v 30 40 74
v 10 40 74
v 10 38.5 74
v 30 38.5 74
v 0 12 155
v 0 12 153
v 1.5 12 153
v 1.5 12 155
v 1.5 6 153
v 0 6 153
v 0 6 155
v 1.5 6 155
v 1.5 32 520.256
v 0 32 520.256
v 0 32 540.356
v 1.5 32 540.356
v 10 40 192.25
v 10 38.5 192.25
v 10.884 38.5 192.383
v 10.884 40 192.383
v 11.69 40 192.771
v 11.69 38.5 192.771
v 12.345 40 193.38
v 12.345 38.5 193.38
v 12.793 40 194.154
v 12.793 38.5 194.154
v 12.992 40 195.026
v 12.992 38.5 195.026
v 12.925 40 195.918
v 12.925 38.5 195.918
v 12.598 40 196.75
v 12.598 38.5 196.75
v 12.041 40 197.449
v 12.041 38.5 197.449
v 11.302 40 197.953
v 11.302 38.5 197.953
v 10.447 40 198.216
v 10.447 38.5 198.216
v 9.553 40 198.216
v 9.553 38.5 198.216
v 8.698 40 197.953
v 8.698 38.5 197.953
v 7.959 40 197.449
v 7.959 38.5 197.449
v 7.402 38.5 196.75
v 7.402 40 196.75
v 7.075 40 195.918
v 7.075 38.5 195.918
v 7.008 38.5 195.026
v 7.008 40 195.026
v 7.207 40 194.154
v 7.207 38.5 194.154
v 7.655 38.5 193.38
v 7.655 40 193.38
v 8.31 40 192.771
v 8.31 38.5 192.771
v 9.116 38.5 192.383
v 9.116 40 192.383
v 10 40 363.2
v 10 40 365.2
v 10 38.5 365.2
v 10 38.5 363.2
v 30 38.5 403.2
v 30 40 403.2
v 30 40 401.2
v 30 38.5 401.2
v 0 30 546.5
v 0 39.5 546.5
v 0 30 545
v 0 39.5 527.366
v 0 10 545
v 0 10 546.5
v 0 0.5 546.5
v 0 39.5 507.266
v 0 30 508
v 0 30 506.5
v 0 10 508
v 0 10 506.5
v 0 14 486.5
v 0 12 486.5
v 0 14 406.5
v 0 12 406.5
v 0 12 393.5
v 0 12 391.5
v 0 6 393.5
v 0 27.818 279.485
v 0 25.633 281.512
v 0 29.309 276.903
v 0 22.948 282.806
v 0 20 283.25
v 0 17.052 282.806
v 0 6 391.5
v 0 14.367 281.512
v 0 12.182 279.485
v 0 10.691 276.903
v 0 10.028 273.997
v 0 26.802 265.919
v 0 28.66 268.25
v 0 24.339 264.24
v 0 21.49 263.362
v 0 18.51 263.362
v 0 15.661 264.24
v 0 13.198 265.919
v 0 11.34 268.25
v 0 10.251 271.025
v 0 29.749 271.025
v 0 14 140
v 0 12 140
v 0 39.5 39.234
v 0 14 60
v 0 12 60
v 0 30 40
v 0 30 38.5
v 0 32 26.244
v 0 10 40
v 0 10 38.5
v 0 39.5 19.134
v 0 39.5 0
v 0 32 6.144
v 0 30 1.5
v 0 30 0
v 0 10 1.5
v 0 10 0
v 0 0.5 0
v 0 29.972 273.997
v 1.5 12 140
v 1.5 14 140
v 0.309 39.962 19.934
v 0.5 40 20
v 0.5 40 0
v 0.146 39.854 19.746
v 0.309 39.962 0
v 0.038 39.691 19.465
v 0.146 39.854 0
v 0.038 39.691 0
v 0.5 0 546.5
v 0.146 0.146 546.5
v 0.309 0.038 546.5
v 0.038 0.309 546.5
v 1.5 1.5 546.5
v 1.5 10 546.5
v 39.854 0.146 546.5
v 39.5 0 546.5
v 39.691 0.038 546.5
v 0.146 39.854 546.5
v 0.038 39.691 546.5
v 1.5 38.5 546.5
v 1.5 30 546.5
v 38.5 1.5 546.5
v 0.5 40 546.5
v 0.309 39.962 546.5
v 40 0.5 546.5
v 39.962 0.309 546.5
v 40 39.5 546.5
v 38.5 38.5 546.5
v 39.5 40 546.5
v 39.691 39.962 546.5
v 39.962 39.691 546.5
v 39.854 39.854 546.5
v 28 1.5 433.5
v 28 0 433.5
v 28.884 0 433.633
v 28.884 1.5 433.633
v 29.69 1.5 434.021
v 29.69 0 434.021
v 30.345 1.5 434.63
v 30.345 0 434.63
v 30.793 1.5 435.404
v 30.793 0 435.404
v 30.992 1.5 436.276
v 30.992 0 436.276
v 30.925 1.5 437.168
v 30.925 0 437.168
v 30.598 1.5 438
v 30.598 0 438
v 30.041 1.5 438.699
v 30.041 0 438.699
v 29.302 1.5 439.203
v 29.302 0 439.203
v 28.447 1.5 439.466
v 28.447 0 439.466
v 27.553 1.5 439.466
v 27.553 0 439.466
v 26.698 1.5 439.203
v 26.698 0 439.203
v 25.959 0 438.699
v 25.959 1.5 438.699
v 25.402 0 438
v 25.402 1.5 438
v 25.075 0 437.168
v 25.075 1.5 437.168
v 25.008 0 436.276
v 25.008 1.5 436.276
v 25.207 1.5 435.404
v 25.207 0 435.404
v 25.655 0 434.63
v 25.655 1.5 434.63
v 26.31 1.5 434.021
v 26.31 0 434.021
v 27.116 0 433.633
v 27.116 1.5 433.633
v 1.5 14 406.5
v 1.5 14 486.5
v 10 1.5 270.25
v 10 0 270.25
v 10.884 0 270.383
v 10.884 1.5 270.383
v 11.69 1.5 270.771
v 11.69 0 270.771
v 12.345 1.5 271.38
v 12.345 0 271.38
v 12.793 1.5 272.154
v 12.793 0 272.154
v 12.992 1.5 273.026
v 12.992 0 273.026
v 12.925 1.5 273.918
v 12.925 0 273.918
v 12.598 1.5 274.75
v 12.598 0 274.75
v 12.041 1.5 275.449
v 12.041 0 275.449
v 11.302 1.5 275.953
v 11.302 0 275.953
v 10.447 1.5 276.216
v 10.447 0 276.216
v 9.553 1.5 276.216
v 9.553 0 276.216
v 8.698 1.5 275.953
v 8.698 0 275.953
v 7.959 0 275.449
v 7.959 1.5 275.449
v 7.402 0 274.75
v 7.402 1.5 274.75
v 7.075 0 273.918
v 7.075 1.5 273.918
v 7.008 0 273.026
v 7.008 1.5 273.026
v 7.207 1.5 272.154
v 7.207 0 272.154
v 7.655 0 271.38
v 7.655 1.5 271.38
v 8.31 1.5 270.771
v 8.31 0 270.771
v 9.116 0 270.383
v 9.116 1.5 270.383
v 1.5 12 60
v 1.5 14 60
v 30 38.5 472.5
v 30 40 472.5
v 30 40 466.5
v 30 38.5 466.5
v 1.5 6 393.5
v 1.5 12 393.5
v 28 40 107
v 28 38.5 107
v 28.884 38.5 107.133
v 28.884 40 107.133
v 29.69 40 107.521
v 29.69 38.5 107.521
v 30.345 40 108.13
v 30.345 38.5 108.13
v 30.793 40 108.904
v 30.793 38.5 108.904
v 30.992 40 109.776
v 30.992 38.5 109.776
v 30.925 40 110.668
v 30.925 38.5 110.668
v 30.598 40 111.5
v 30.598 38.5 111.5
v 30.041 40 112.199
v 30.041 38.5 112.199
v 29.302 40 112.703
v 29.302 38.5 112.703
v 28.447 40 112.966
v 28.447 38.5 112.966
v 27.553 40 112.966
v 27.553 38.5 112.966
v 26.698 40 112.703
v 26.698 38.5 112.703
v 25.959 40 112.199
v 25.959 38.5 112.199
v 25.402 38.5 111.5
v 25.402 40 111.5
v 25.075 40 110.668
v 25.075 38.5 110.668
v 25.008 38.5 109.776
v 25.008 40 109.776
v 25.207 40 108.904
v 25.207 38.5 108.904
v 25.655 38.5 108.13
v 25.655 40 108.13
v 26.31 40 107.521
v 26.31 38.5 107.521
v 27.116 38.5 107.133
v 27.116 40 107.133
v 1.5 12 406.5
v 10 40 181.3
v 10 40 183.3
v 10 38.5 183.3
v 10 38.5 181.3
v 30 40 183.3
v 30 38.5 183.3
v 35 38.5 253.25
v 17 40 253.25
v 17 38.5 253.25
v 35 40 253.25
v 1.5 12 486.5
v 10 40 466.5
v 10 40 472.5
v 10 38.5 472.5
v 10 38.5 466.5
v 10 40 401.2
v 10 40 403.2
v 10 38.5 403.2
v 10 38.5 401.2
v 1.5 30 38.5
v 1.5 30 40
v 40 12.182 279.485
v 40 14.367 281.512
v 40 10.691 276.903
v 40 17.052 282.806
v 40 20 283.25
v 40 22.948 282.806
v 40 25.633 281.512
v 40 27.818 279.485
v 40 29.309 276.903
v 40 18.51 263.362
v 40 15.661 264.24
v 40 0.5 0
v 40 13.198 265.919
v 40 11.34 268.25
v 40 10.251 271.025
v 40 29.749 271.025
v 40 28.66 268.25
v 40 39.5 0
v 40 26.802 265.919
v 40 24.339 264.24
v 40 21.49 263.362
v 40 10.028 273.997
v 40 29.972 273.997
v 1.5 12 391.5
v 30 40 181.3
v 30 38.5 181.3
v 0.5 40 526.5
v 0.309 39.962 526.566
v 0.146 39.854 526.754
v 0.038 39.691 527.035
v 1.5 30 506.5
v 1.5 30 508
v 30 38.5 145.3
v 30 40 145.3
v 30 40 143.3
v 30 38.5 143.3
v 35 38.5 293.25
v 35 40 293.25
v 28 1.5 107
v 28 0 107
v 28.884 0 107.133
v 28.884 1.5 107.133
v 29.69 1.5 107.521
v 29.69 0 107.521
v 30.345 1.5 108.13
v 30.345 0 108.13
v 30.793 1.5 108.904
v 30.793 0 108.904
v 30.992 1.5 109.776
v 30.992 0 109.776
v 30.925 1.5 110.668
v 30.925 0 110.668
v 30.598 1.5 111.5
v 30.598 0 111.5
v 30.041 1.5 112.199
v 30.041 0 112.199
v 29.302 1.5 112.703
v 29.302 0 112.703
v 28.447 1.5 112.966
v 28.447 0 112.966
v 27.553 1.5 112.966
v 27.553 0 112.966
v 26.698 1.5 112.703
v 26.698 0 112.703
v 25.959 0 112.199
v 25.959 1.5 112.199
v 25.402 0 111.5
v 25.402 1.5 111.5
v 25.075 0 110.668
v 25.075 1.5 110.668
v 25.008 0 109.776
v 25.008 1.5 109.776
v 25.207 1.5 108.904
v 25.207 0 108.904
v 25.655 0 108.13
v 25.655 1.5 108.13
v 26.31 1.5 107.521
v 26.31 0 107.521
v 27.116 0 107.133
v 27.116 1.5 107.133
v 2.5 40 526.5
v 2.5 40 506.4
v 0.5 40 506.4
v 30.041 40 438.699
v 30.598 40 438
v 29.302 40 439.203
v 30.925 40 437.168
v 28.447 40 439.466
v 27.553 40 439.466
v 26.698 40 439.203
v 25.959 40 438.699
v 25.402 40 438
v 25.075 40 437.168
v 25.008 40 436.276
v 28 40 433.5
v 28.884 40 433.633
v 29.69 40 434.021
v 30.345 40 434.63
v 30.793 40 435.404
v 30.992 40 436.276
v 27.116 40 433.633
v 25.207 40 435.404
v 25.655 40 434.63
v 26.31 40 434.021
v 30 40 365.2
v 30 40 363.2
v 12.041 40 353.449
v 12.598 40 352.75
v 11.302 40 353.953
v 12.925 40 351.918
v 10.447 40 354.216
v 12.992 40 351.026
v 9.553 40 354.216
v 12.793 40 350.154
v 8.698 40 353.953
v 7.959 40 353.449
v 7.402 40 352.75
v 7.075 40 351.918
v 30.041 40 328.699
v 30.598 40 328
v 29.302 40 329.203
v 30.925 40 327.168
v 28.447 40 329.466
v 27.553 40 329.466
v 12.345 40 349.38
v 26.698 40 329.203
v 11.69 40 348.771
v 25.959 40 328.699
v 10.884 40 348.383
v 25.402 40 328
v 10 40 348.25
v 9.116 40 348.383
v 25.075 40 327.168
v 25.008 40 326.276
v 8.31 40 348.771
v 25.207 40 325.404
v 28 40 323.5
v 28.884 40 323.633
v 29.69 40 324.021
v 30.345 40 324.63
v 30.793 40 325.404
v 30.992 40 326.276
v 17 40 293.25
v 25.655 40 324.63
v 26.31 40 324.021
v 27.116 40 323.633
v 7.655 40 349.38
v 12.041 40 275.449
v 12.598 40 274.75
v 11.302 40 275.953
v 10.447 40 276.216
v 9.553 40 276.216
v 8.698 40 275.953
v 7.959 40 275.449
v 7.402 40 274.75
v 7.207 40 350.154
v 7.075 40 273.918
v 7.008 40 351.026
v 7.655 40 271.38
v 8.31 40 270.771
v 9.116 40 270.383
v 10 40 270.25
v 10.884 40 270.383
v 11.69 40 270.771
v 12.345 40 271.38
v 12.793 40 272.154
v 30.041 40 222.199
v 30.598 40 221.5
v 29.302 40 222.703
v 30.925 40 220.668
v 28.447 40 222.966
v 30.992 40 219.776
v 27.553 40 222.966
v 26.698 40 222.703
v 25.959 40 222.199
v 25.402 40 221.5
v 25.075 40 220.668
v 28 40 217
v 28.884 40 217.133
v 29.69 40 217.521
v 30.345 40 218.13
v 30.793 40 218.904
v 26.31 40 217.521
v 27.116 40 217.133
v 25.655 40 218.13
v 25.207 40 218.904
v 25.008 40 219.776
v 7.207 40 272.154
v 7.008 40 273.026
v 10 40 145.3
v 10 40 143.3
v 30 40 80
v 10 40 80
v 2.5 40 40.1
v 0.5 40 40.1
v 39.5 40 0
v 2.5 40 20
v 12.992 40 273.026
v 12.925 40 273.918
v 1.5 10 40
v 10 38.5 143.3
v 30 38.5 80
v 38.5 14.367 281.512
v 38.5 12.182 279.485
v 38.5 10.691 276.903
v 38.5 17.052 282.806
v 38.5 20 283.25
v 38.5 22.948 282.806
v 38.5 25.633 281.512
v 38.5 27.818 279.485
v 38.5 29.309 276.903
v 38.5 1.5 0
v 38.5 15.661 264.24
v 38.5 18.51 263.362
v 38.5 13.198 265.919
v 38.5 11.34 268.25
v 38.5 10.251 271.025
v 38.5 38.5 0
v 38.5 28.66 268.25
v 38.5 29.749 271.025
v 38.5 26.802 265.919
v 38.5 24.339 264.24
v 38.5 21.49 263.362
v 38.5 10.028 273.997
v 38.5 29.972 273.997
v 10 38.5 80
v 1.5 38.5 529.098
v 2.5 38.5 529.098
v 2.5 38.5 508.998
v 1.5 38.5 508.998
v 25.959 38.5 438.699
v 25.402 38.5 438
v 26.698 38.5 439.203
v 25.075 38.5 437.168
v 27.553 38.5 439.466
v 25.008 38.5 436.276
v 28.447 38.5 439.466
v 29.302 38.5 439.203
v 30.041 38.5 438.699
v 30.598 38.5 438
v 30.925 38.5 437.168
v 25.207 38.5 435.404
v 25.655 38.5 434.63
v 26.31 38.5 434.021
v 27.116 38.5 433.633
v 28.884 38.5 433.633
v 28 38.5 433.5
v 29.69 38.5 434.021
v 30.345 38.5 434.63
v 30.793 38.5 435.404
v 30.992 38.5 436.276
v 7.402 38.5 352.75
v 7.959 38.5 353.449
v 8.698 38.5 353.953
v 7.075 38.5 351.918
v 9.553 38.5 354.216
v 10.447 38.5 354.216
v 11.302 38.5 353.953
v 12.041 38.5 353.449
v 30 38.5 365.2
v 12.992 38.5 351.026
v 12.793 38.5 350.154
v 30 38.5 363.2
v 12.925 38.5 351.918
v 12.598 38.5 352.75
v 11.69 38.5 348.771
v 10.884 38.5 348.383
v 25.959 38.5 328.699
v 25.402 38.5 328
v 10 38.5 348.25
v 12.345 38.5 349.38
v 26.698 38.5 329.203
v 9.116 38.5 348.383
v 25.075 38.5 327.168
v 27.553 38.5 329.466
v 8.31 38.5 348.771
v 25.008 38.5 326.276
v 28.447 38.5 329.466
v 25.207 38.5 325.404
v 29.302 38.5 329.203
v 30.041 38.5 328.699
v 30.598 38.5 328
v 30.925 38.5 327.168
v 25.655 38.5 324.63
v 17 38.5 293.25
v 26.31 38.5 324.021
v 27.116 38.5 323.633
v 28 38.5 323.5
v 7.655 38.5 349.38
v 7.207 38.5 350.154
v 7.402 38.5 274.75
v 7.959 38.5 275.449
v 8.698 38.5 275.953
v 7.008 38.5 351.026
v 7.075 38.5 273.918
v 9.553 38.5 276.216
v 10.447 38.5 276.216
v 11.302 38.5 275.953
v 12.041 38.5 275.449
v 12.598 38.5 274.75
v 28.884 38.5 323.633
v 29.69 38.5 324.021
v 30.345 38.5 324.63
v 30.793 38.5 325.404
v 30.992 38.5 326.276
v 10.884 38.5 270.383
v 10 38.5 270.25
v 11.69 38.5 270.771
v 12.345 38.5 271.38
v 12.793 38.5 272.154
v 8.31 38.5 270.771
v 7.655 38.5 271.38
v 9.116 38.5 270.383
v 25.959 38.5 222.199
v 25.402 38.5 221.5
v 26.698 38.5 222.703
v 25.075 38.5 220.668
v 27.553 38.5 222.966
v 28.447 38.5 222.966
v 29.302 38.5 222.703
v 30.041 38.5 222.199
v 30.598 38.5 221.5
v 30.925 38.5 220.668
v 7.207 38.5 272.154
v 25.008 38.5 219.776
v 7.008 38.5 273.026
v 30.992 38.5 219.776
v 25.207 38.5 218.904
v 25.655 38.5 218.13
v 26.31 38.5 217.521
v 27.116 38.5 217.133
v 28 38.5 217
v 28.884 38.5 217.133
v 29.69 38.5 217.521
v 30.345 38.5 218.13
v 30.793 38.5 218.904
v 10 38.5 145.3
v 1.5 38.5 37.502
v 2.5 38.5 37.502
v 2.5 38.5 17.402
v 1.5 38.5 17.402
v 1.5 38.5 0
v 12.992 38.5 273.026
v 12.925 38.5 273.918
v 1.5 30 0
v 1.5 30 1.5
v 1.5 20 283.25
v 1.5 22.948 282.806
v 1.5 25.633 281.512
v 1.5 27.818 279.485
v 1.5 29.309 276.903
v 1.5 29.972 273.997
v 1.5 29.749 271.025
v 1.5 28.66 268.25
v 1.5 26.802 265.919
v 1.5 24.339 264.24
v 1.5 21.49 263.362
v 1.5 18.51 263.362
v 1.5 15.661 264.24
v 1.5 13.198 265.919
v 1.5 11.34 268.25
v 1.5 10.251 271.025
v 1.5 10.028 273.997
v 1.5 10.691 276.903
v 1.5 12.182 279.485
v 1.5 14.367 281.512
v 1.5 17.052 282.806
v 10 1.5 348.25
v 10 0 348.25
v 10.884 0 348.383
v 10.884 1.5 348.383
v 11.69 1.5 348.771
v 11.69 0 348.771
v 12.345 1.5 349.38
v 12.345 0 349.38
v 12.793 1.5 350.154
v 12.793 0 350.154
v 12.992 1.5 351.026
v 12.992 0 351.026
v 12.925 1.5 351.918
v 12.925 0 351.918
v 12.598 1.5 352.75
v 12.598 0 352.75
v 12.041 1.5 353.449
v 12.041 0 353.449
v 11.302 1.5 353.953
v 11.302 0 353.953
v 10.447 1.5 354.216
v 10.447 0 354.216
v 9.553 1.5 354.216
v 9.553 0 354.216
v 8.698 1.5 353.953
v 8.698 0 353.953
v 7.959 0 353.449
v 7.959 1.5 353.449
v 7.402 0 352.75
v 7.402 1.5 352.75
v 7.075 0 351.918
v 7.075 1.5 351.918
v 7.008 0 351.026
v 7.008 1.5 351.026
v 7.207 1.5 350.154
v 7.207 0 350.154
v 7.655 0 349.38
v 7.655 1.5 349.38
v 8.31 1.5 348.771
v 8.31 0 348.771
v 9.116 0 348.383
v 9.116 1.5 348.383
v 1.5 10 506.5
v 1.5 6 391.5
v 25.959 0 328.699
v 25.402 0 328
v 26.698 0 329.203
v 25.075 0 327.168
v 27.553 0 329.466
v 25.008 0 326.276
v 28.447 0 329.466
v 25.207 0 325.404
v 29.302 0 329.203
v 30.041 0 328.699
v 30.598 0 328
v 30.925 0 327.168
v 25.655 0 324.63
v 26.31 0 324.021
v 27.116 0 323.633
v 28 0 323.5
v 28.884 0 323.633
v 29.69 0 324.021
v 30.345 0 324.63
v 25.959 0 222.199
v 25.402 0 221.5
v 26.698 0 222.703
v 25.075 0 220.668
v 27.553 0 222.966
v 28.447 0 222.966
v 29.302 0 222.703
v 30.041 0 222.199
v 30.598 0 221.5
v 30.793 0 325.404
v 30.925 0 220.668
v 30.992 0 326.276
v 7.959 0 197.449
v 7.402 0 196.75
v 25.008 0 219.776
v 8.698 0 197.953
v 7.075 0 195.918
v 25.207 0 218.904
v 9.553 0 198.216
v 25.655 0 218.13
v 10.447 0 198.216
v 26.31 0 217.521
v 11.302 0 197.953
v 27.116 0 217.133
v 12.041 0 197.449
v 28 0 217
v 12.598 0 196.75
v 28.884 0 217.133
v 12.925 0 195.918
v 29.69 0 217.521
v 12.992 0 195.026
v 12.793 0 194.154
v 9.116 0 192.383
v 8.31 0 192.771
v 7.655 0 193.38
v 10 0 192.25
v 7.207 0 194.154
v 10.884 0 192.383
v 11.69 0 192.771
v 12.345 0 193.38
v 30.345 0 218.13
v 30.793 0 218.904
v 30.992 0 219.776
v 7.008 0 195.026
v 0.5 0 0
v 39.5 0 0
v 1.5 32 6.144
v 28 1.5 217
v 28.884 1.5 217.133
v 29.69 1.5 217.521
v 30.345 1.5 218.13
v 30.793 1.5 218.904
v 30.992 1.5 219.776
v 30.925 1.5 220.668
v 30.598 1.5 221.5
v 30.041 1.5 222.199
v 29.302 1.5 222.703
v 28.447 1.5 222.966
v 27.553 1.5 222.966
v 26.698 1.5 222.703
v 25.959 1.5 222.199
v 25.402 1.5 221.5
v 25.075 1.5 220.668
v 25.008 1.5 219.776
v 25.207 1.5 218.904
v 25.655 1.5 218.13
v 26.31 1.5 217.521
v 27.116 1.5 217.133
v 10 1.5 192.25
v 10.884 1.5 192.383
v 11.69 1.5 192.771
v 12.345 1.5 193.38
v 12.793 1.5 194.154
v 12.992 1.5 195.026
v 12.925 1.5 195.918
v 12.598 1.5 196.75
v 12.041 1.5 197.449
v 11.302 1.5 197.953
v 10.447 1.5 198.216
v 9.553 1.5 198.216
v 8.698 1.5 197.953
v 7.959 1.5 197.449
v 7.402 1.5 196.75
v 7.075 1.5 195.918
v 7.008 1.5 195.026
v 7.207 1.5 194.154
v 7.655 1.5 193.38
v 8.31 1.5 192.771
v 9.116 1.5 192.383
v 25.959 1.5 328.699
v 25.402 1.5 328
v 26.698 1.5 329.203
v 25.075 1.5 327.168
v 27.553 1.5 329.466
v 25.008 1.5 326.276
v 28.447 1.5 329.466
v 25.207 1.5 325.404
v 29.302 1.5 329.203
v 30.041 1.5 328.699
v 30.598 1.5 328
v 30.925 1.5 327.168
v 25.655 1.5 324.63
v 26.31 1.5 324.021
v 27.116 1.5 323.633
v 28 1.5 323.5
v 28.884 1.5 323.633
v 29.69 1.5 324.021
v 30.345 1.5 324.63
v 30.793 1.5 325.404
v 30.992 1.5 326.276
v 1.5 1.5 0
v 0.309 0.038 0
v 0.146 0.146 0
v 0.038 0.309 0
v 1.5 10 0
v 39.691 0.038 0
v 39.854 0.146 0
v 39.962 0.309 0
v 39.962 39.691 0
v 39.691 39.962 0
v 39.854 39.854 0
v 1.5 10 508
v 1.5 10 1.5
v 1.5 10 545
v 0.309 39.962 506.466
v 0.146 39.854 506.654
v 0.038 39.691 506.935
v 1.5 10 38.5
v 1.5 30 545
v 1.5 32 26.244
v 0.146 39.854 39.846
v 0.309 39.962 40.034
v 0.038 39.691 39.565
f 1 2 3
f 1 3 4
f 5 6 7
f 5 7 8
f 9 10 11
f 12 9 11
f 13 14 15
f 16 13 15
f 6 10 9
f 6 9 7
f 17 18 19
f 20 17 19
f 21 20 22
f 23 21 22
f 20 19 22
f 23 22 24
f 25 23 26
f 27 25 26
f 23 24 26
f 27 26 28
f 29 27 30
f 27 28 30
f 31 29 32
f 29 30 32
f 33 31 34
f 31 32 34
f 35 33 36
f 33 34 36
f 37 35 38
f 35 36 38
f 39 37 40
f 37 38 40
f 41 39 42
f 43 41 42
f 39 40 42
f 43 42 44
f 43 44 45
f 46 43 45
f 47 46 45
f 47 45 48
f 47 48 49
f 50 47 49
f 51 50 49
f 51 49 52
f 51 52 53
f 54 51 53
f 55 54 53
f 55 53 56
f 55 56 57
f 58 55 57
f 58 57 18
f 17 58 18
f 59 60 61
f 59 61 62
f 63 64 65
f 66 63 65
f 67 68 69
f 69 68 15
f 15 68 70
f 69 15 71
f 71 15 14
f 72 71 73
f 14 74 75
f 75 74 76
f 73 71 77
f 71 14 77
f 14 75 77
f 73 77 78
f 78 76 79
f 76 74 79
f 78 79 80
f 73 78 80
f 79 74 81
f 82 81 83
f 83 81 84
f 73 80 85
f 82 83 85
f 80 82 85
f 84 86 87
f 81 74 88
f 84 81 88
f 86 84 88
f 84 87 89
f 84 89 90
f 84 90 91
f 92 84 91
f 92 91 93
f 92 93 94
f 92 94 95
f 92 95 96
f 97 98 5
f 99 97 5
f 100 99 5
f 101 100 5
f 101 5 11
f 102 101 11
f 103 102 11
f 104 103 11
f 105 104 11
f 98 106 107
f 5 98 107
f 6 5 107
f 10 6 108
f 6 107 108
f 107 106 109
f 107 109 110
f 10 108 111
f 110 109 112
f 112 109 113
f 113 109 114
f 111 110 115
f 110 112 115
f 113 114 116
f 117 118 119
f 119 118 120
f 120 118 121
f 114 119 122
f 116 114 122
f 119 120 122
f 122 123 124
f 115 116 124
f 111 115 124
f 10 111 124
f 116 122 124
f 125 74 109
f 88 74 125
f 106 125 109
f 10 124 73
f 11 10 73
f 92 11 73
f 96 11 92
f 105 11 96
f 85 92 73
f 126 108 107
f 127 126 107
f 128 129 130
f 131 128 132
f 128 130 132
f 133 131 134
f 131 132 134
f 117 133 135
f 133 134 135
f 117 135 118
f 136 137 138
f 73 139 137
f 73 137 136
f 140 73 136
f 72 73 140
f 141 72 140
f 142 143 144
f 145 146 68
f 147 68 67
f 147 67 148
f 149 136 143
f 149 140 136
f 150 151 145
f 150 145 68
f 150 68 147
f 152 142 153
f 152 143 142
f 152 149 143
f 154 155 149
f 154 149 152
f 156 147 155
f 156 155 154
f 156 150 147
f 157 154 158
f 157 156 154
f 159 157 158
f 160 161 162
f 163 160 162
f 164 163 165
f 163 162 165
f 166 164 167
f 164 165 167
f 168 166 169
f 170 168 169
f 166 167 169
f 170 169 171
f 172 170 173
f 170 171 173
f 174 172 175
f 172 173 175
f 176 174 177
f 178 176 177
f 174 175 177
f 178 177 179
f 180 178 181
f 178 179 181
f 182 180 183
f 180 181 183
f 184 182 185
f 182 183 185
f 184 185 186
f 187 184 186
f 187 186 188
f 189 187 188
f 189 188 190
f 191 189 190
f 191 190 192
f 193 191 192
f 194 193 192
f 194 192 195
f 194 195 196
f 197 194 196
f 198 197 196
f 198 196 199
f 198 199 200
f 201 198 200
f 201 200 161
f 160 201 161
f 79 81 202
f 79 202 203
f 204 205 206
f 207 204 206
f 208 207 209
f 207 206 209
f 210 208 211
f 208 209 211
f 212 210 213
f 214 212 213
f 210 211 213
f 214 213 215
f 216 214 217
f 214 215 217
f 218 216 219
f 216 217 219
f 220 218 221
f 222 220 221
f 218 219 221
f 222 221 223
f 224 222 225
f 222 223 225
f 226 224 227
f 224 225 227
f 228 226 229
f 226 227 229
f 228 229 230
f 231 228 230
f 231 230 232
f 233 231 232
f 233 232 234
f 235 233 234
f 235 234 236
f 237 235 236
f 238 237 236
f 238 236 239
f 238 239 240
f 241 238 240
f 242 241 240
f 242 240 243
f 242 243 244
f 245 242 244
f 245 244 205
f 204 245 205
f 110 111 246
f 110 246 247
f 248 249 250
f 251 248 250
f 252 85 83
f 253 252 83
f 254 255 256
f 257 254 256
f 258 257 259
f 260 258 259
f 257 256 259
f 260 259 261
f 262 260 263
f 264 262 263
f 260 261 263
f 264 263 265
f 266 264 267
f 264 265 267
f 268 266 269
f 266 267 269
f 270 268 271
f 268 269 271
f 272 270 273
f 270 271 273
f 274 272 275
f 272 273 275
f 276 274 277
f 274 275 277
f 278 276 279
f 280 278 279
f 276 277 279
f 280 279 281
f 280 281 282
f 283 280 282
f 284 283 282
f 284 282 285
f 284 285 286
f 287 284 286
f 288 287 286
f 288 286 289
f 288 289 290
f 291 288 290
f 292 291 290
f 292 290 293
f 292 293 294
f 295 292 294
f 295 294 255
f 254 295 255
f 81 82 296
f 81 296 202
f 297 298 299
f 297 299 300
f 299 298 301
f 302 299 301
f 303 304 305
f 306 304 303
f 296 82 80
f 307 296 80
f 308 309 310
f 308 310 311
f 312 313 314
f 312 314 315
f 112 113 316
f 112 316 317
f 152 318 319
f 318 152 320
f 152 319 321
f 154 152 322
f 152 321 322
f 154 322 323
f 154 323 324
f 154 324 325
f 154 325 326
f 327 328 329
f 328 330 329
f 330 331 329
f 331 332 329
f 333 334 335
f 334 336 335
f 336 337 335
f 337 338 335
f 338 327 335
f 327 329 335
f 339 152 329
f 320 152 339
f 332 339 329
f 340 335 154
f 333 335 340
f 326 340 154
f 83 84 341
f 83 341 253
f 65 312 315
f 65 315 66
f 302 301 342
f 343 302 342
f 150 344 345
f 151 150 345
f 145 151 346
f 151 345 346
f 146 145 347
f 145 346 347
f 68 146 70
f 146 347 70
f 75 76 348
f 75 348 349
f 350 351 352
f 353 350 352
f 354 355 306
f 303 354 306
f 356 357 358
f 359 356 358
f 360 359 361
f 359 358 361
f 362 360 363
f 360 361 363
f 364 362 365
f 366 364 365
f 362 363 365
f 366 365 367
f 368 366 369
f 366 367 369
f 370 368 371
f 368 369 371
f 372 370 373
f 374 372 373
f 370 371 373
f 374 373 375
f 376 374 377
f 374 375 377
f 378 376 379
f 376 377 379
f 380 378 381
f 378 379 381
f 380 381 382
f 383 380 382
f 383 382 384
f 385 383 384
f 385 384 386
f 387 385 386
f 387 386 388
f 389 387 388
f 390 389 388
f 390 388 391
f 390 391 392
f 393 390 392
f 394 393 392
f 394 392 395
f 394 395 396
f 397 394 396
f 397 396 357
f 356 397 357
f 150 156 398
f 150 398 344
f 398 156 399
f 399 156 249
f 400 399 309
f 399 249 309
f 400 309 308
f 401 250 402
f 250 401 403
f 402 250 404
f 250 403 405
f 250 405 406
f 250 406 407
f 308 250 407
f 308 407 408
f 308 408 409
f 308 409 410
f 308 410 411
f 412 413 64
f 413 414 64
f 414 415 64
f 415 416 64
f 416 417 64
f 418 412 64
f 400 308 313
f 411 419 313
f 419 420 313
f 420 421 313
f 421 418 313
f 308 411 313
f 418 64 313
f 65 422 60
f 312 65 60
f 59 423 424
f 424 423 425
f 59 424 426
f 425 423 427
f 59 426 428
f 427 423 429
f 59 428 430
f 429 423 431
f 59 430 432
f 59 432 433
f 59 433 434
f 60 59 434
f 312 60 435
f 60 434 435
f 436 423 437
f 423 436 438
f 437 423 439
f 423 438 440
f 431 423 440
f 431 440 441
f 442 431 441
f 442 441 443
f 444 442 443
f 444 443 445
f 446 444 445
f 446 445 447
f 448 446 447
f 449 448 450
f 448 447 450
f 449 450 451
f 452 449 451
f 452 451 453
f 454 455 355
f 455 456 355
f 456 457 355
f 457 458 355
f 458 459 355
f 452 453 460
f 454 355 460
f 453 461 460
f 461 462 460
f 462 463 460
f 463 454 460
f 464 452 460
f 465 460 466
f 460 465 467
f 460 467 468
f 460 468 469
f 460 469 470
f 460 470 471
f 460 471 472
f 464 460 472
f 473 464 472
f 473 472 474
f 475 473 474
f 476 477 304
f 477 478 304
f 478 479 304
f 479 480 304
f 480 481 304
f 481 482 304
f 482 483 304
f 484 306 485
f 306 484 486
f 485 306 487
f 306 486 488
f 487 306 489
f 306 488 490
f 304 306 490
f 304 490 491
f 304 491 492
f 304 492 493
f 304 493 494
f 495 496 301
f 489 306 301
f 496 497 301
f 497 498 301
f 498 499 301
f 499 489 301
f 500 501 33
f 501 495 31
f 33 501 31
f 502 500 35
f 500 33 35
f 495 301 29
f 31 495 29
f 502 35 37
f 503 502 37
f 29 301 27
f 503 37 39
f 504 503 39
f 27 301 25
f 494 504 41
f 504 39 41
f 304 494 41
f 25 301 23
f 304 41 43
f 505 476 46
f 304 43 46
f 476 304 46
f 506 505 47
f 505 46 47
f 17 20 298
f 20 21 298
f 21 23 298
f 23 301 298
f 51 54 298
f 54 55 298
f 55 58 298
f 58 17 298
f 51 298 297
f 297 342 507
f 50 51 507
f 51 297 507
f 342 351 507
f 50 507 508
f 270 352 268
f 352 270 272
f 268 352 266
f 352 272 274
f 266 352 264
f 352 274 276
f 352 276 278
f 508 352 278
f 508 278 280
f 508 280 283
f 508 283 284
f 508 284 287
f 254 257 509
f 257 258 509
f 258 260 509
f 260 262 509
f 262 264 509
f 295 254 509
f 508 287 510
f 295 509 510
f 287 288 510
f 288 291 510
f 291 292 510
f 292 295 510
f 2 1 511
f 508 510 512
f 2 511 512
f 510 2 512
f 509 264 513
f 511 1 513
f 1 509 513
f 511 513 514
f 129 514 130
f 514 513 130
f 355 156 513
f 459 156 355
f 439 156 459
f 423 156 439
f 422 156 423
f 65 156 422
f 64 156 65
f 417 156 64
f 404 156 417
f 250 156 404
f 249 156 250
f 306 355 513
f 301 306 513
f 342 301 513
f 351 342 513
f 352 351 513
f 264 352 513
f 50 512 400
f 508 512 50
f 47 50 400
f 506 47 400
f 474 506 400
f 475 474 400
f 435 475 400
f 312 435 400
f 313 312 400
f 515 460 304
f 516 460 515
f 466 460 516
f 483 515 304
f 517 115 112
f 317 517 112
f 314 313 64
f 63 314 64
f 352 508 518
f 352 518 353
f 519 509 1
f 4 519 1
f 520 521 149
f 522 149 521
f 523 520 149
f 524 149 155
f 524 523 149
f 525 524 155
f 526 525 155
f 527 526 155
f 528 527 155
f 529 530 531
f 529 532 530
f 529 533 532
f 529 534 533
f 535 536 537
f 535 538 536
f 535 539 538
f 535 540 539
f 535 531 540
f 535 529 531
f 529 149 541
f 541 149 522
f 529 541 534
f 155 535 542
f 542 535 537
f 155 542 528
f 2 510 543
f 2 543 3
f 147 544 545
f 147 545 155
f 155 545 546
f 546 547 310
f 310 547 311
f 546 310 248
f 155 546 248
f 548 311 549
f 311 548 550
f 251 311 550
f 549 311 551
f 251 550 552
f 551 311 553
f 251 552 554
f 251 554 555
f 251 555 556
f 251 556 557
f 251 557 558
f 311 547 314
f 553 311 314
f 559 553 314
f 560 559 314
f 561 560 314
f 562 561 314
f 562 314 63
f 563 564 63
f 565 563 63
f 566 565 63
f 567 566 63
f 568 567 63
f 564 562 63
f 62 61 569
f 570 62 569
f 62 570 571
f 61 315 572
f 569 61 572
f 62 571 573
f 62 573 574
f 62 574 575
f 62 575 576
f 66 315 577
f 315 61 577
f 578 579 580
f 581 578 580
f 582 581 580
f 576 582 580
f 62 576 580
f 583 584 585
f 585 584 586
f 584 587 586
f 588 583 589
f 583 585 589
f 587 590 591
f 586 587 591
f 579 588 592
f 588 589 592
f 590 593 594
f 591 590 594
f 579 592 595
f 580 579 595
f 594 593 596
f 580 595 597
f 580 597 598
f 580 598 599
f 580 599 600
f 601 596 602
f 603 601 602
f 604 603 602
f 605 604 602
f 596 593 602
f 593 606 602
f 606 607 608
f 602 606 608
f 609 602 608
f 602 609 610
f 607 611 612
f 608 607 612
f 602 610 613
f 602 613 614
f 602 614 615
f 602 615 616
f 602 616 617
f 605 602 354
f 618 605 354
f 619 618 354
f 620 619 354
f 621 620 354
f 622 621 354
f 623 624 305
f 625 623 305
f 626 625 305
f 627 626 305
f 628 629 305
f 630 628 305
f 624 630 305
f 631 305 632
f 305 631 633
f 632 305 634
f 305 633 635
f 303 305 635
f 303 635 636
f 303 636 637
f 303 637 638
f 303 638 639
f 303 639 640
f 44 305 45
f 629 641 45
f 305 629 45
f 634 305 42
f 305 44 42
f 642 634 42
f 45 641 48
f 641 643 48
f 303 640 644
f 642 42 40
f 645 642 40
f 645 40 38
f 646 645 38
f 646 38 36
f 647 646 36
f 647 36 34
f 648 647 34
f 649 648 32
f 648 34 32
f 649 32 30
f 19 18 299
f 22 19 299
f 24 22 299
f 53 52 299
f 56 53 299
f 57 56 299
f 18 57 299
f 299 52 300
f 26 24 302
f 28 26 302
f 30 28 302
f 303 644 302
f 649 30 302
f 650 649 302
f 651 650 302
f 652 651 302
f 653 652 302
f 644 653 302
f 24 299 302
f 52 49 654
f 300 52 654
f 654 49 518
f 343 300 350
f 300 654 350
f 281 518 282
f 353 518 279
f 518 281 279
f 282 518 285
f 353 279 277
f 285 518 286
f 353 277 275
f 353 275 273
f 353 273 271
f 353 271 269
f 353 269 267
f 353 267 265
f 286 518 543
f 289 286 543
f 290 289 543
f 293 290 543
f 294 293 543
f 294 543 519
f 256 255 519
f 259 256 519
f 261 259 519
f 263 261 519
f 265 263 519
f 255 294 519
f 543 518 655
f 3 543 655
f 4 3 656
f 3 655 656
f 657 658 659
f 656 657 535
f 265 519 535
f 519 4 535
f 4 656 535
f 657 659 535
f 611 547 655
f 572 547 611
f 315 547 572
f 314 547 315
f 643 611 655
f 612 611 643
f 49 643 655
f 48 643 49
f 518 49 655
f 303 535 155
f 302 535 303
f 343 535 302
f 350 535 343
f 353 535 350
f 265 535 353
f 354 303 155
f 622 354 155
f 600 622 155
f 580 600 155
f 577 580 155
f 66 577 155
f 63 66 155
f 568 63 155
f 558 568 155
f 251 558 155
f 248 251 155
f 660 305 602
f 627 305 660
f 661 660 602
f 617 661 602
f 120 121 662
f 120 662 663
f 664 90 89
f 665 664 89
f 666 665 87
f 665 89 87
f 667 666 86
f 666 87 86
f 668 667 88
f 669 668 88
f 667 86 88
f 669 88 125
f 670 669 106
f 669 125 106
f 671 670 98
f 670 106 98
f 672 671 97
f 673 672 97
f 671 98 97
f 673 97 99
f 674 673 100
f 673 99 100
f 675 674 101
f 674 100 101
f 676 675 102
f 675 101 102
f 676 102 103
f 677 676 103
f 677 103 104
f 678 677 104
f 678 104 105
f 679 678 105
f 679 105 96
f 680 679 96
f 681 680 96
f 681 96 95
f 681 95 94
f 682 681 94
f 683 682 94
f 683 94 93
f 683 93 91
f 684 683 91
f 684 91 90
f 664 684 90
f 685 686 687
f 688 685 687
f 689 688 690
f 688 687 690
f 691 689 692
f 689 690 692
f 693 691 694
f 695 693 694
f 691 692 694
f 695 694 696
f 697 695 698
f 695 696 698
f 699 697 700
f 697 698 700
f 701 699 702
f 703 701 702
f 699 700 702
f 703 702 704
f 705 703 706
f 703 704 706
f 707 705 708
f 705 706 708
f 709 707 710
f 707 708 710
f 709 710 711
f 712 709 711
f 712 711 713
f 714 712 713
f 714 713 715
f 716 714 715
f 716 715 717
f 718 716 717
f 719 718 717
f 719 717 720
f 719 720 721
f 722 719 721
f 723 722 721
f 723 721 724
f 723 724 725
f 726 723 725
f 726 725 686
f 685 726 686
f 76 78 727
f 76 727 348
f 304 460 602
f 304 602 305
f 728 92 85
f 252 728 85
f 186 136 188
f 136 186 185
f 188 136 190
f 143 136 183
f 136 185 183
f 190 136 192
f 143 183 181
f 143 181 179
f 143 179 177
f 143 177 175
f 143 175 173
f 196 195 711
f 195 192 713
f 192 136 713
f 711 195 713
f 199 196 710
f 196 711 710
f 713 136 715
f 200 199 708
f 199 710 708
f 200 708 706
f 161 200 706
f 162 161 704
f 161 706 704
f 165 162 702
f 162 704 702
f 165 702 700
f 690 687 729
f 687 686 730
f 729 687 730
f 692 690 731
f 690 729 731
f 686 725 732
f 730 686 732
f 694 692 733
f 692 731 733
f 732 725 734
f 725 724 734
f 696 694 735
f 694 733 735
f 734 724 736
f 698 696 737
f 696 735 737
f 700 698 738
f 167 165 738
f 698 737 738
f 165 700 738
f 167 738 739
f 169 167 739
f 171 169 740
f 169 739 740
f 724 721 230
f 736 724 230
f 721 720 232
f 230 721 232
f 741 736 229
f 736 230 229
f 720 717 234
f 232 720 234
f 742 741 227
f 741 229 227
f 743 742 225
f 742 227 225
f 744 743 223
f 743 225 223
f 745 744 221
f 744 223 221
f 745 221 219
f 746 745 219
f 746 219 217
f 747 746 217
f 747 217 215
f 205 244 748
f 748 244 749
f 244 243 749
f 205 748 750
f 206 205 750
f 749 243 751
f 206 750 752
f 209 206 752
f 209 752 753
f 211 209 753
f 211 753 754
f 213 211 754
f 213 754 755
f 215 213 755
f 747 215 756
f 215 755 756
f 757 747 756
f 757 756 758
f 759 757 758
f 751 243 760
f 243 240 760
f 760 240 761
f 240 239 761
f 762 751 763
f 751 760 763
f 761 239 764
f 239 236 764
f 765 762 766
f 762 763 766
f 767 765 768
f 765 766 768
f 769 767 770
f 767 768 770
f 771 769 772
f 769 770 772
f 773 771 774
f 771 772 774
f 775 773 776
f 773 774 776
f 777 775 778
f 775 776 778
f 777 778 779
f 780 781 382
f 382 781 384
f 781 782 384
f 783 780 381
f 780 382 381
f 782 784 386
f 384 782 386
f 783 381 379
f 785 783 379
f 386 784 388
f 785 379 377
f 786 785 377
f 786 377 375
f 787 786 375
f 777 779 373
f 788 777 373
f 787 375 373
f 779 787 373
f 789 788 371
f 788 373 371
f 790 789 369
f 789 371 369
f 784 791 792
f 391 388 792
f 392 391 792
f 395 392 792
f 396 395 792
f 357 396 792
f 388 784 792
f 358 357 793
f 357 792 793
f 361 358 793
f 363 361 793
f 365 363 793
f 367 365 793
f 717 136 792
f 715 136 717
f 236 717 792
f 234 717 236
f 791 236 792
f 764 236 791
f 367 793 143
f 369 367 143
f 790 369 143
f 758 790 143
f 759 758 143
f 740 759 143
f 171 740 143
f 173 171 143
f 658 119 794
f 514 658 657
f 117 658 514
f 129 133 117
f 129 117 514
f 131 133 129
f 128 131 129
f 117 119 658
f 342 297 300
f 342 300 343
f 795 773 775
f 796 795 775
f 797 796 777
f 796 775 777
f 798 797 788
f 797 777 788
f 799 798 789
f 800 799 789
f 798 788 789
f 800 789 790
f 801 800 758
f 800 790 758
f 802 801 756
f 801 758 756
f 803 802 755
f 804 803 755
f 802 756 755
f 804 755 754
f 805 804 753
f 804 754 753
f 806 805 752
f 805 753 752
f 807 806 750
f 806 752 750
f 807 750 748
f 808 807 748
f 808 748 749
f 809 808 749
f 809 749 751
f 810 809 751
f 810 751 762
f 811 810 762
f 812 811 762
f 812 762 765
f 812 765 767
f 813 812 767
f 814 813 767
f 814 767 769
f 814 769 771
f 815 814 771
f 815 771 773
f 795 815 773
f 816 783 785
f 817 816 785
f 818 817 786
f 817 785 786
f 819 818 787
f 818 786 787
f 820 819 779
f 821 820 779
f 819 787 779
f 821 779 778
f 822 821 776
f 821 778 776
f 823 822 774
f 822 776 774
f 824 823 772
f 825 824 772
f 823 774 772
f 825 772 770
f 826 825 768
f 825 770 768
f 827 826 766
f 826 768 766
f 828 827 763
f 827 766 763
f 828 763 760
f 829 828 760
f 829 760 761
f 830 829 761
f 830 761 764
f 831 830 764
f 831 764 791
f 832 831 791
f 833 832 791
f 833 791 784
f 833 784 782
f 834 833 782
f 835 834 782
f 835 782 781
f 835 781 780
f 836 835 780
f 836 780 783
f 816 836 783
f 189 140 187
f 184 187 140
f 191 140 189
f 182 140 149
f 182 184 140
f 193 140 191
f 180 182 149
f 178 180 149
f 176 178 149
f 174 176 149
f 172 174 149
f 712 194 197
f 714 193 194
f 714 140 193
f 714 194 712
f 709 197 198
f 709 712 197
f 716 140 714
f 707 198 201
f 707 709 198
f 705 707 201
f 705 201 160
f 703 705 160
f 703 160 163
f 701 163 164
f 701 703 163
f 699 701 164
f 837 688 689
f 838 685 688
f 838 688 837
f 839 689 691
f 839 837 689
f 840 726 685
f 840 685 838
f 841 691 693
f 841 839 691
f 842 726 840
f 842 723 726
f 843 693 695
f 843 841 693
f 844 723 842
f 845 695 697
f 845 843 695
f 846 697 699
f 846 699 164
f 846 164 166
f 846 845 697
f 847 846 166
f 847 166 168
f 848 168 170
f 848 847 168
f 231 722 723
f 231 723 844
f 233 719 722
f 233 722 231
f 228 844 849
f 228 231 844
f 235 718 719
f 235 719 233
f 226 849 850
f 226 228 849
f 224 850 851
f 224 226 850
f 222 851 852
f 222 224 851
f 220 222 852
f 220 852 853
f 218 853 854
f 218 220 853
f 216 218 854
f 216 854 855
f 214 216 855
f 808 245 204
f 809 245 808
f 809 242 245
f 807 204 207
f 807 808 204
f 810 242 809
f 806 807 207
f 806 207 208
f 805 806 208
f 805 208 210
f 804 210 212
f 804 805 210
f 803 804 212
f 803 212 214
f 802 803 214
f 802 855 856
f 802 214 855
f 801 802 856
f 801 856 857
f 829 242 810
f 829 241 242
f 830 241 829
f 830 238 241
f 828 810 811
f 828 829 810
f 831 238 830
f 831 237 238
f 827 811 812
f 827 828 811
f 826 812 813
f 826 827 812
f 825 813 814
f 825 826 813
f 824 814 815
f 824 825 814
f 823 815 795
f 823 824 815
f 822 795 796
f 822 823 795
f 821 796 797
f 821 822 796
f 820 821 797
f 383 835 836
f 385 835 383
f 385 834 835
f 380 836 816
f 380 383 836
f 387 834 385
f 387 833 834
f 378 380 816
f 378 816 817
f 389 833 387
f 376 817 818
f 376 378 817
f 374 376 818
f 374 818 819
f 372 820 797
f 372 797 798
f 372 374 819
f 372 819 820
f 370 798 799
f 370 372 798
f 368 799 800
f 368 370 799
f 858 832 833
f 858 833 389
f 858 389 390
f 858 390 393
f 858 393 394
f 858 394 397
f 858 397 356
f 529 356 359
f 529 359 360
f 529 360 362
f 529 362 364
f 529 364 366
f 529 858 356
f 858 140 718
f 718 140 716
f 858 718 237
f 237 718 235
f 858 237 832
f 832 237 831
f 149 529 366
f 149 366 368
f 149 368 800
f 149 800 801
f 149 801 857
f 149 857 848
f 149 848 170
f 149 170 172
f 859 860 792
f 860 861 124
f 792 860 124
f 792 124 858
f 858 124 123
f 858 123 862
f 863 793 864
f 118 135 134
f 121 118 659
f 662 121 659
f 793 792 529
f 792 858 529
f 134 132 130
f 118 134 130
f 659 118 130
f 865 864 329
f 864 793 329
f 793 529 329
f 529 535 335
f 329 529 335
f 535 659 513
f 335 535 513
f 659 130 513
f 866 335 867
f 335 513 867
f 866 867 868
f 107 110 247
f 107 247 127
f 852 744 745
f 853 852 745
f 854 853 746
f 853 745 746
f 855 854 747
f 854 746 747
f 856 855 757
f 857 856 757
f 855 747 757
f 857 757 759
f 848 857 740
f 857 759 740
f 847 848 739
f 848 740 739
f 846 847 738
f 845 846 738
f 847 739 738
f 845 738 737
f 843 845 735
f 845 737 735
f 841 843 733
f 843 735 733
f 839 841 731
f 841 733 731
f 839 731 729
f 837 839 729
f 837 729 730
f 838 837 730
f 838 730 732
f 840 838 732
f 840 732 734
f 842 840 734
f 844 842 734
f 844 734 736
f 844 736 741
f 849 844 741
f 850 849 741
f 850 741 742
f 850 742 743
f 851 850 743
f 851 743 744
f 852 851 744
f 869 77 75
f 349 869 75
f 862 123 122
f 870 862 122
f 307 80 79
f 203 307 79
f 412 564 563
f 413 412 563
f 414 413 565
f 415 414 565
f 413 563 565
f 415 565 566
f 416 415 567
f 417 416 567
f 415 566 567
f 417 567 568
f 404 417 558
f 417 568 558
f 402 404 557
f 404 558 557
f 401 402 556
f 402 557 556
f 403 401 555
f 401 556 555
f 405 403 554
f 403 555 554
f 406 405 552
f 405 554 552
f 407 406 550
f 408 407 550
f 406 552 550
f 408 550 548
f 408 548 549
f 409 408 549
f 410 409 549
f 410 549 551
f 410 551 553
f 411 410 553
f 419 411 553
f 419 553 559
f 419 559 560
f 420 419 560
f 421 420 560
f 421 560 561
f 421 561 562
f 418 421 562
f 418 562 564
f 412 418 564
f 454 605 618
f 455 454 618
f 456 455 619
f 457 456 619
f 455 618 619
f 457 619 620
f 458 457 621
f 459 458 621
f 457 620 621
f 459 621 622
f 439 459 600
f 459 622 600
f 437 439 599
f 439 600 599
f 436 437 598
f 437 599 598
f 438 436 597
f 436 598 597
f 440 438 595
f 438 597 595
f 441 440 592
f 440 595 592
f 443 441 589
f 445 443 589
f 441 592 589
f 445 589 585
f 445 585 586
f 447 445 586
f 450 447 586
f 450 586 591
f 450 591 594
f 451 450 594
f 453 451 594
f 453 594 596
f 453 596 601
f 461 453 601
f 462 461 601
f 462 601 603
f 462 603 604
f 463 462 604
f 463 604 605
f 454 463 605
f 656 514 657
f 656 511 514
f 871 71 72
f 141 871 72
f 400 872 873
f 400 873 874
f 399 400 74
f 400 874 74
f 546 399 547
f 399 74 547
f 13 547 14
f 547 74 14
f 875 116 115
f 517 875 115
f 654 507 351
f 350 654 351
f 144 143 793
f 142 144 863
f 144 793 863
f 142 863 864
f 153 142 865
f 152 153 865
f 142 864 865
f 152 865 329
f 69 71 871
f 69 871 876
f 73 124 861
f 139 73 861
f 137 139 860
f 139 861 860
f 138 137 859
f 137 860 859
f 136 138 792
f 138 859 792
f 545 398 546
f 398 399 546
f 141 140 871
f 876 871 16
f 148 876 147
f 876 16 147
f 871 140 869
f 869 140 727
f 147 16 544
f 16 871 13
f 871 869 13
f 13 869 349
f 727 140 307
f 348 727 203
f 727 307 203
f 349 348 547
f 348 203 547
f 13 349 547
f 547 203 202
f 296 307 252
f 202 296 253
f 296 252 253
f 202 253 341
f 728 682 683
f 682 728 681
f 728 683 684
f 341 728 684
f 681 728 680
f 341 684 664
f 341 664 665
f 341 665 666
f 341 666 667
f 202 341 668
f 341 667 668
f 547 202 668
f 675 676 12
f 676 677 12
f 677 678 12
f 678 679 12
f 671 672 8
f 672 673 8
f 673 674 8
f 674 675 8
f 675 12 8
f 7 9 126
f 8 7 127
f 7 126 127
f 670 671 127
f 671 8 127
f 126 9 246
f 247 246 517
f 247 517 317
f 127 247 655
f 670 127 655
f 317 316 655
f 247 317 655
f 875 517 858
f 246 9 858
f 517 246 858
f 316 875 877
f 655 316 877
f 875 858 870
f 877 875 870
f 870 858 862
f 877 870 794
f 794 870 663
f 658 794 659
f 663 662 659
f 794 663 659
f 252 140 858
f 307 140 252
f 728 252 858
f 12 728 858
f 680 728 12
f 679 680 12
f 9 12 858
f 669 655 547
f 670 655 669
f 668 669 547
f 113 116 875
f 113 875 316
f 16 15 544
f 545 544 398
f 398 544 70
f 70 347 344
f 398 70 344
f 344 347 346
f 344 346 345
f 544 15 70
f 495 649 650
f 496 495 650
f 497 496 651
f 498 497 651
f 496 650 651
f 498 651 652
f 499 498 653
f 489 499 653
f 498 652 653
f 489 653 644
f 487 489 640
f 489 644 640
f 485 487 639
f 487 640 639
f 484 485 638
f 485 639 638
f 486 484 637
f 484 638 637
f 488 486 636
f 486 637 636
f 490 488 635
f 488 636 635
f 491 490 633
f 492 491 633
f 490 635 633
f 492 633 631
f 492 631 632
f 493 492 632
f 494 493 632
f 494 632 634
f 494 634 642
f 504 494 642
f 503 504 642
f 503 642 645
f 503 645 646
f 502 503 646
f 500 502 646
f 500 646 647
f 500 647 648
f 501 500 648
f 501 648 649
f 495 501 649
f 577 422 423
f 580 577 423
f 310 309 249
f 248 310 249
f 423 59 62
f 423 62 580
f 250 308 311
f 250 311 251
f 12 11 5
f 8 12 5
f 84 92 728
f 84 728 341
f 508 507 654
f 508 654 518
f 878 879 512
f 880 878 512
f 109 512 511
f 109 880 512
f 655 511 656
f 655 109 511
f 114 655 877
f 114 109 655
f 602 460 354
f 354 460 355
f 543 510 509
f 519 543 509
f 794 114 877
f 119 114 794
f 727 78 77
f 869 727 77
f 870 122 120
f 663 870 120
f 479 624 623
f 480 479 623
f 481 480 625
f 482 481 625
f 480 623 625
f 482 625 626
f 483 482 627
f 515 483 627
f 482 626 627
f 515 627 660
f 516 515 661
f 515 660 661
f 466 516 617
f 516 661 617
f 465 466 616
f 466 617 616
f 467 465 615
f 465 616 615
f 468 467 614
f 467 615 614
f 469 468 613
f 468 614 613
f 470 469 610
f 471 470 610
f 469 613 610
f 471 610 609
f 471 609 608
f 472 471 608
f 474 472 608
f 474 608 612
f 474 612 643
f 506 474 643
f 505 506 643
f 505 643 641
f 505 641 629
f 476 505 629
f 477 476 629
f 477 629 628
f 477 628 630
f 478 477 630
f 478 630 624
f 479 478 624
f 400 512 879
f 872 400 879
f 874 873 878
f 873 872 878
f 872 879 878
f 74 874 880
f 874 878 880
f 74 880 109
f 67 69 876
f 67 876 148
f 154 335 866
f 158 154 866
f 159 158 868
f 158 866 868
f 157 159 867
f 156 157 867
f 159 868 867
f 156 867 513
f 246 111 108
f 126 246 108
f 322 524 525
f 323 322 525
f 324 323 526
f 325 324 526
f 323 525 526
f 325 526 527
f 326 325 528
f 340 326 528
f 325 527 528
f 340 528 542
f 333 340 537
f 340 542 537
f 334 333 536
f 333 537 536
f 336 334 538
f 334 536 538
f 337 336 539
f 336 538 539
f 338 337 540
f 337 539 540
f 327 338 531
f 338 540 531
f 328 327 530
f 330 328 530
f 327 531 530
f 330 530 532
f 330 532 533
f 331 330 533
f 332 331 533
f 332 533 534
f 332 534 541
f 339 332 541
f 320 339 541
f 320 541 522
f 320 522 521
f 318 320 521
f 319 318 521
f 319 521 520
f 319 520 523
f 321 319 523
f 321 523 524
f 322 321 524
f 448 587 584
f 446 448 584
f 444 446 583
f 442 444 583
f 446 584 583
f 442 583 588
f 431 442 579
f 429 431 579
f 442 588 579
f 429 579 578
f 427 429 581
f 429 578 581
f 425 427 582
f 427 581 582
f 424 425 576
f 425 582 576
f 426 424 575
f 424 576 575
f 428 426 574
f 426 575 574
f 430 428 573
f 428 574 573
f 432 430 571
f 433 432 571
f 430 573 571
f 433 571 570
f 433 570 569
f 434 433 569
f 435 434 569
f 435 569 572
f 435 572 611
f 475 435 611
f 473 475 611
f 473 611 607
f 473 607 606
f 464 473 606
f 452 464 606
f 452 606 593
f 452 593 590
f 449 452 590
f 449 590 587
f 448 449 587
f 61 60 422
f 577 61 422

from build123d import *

# Parameters (mm, degrees)
SKETCH1_W           = 37
SKETCH1_H           = 37
BOSS_EXTRUDE1_DEPTH = 546.5
SKETCH2_W           = 1.5
SKETCH2_H           = 20
SKETCH2_W_2         = 80
SKETCH2_H_2         = 2
SKETCH2_W_3         = 2
SKETCH2_H_3         = 6
CUT_EXTRUDE1_DEPTH  = 2.5
SKETCH3_W           = 20
SKETCH3_H           = 6
CUT_EXTRUDE2_DEPTH  = 1.5
SKETCH4_W           = 20
SKETCH4_H           = 2
CUT_EXTRUDE3_DEPTH  = 2
SKETCH5_R           = 3
CUT_EXTRUDE4_DEPTH  = 550.419921372
SKETCH6_R           = 3
CUT_EXTRUDE5_DEPTH  = 550.419921372
SKETCH7_R           = 10
CUT_EXTRUDE6_DEPTH  = 550.419921372
SKETCH8_W           = 18
SKETCH8_H           = 40
CUT_EXTRUDE7_DEPTH  = 10


with BuildPart() as part:
    # Sketch1 → Boss-Extrude1 (new body)
    with BuildSketch(Plane.XY):
        with BuildLine():
            Line((0.5, 0), (39.5, 0))
            ThreePointArc((39.5, 0), (39.853553391, 0.146446609), (40, 0.5))
            Line((40, 0.5), (40, 39.5))
            ThreePointArc((40, 39.5), (39.853553391, 39.853553391), (39.5, 40))
            Line((39.5, 40), (0.5, 40))
            ThreePointArc((0.5, 40), (0.146446609, 39.853553391), (0, 39.5))
            Line((0, 39.5), (0, 0.5))
            ThreePointArc((0, 0.5), (0.146446609, 0.146446609), (0.5, 0))
        make_face()
        with Locations((20, 20)):
            Rectangle(SKETCH1_W, SKETCH1_H, mode=Mode.SUBTRACT)
    extrude(amount=BOSS_EXTRUDE1_DEPTH)

    # Sketch2 → Cut-Extrude1 (cut)
    with BuildSketch(Plane.ZY):
        with Locations((0.75, 20)):
            Rectangle(SKETCH2_W, SKETCH2_H)
        with Locations((39.25, 20)):
            Rectangle(SKETCH2_W, SKETCH2_H)
        with Locations((507.25, 20)):
            Rectangle(SKETCH2_W, SKETCH2_H)
        with Locations((545.75, 20)):
            Rectangle(SKETCH2_W, SKETCH2_H)
        with Locations((446.5, 13)):
            Rectangle(SKETCH2_W_2, SKETCH2_H_2)
        with Locations((100, 13)):
            Rectangle(SKETCH2_W_2, SKETCH2_H_2)
        with Locations((154, 9)):
            Rectangle(SKETCH2_W_3, SKETCH2_H_3)
        with Locations((392.5, 9)):
            Rectangle(SKETCH2_W_3, SKETCH2_H_3)
        Polygon((40.1, 40), (26.243593539, 32), (6.143593539, 32), (20, 40), align=None)
        Polygon((520.256406461, 32), (540.356406461, 32), (526.5, 40), (506.4, 40), align=None)
    extrude(amount=-CUT_EXTRUDE1_DEPTH, mode=Mode.SUBTRACT)

    # Sketch3 → Cut-Extrude2 (cut)
    with BuildSketch(Plane(origin=(0, 40, 0), x_dir=(1, 0, 0), z_dir=(0, 1, 0))):
        with Locations((20, -469.5)):
            Rectangle(SKETCH3_W, SKETCH3_H)
        with Locations((20, -77)):
            Rectangle(SKETCH3_W, SKETCH3_H)
    extrude(amount=-CUT_EXTRUDE2_DEPTH, mode=Mode.SUBTRACT)

    # Sketch4 → Cut-Extrude3 (cut)
    with BuildSketch(Plane(origin=(0, 40, 0), x_dir=(1, 0, 0), z_dir=(0, 1, 0))):
        with Locations((20, -144.3)):
            Rectangle(SKETCH4_W, SKETCH4_H)
        with Locations((20, -182.3)):
            Rectangle(SKETCH4_W, SKETCH4_H)
        with Locations((20, -364.2)):
            Rectangle(SKETCH4_W, SKETCH4_H)
        with Locations((20, -402.2)):
            Rectangle(SKETCH4_W, SKETCH4_H)
    extrude(amount=-CUT_EXTRUDE3_DEPTH, mode=Mode.SUBTRACT)

    # Sketch5 → Cut-Extrude4 (cut, through all)
    with BuildSketch(Plane.XZ):
        with Locations(Location((10, 351.25, 0), (0, 0, 270))):
            Circle(SKETCH5_R)
        with Locations(Location((10, 195.25, 0), (0, 0, 270))):
            Circle(SKETCH5_R)
        with Locations(Location((10, 273.25, 0), (0, 0, 270))):
            Circle(SKETCH5_R)
    extrude(amount=-CUT_EXTRUDE4_DEPTH, mode=Mode.SUBTRACT)

    # Sketch6 → Cut-Extrude5 (cut, through all)
    with BuildSketch(Plane(origin=(0, 0, 0), x_dir=(-1, 0, 0), z_dir=(0, -1, 0))):
        with Locations(Location((-28, -436.5, 0), (0, 0, 90))):
            Circle(SKETCH6_R)
        with Locations(Location((-28, -326.5, 0), (0, 0, 90))):
            Circle(SKETCH6_R)
        with Locations(Location((-28, -220, 0), (0, 0, 90))):
            Circle(SKETCH6_R)
        with Locations(Location((-28, -110, 0), (0, 0, 90))):
            Circle(SKETCH6_R)
    extrude(amount=-CUT_EXTRUDE5_DEPTH, mode=Mode.SUBTRACT)

    # Sketch7 → Cut-Extrude6 (cut, through all)
    with BuildSketch(Plane.ZY):
        with Locations((273.25, 20)):
            Circle(SKETCH7_R)
    extrude(amount=-CUT_EXTRUDE6_DEPTH, mode=Mode.SUBTRACT)

    # Sketch8 → Cut-Extrude7 (cut)
    with BuildSketch(Plane(origin=(0, 40, 0), x_dir=(1, 0, 0), z_dir=(0, 1, 0))):
        with Locations((26, -273.25)):
            Rectangle(SKETCH8_W, SKETCH8_H)
    extrude(amount=-CUT_EXTRUDE7_DEPTH, mode=Mode.SUBTRACT)


solid = part.part
